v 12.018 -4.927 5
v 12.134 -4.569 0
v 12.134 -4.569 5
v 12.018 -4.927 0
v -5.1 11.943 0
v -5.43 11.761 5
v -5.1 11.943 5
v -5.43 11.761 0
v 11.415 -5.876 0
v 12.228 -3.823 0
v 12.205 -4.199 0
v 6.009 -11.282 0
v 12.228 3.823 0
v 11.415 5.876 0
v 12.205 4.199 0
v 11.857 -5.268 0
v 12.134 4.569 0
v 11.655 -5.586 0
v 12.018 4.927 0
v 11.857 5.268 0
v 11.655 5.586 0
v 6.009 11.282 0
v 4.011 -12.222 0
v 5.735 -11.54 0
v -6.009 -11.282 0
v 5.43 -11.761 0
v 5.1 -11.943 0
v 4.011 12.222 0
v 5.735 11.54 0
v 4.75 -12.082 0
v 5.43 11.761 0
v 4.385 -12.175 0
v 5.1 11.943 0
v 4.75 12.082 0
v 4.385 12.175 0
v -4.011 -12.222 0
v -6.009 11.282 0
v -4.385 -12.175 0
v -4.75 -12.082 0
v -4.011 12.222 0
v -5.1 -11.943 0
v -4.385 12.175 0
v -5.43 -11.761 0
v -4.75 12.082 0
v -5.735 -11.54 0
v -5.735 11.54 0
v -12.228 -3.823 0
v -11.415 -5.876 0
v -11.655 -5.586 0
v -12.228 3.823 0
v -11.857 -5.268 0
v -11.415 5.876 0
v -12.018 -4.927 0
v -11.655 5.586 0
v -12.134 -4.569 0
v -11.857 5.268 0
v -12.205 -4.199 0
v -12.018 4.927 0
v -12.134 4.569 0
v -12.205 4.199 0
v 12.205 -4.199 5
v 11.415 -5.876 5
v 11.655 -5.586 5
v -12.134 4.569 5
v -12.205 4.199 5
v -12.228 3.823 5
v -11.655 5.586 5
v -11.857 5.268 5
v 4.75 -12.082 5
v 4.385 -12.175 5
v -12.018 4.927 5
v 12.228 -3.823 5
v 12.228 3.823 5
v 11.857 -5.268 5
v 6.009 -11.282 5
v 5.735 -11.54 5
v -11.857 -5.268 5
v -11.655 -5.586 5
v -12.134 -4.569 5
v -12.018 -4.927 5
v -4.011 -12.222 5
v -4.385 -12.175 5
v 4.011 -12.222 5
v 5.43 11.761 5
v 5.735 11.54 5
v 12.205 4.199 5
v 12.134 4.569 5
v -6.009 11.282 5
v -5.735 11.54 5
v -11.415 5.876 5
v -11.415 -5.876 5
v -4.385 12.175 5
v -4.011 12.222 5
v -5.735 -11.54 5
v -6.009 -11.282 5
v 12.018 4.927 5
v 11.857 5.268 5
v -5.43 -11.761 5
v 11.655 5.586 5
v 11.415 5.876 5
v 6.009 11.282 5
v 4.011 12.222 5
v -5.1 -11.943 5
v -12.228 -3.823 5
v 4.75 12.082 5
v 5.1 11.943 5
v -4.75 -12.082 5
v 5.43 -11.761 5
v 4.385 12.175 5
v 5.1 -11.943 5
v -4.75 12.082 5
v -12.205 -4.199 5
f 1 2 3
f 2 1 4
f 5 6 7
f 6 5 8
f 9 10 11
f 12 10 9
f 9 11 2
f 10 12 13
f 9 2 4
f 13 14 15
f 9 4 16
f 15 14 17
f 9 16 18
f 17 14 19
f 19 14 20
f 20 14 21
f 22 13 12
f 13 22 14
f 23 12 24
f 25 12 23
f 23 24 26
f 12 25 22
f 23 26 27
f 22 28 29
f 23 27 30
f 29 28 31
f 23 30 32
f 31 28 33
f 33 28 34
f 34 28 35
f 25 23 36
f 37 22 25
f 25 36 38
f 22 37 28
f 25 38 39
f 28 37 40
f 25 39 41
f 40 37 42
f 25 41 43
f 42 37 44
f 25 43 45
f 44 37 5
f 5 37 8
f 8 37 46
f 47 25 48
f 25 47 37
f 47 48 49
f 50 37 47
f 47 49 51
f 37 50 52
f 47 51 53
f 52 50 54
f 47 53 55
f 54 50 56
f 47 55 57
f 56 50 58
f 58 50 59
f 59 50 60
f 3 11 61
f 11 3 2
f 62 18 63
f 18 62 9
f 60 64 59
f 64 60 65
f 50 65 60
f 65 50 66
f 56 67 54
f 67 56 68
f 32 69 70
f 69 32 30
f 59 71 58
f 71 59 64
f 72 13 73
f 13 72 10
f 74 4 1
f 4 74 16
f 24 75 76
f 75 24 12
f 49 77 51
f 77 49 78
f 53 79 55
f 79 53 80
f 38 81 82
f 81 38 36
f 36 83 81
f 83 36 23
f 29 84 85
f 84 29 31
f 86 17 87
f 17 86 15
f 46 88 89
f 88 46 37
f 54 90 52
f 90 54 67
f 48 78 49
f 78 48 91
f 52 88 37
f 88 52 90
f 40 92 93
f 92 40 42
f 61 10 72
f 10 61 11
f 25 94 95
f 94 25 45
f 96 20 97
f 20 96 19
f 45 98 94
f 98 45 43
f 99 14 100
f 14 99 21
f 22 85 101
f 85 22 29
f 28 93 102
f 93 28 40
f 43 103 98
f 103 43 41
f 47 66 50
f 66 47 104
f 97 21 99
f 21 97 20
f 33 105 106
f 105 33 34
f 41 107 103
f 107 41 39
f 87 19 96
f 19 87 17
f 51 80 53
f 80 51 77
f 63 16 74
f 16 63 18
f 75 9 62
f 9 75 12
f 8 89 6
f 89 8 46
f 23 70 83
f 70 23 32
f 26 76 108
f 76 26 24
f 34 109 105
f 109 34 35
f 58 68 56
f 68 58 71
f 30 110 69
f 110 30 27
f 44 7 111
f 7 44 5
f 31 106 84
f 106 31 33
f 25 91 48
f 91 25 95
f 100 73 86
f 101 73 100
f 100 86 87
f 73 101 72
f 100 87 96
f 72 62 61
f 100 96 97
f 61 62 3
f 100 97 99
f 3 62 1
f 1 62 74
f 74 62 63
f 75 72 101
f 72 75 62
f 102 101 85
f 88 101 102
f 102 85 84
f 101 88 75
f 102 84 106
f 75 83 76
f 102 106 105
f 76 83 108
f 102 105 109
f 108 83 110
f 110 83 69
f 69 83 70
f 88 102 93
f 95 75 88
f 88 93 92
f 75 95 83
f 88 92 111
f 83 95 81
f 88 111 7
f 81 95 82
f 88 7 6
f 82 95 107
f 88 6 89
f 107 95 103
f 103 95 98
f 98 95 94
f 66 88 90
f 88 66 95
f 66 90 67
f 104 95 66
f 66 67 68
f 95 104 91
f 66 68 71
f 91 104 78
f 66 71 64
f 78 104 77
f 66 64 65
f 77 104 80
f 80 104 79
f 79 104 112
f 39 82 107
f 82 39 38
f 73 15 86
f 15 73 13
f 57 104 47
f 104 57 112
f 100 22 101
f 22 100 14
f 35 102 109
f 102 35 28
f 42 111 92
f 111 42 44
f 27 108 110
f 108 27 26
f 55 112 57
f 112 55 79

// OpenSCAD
$fn = 50;

difference() {
	union() {
		hull() {
			translate(v = [9.228355330395567, 3.8225099362478887, 0]) {
				cylinder(h = 5, r = 3);
			}
			translate(v = [3.8225099362478896, 9.228355330395567, 0]) {
				cylinder(h = 5, r = 3);
			}
			translate(v = [-3.8225099362478883, 9.228355330395567, 0]) {
				cylinder(h = 5, r = 3);
			}
			translate(v = [-9.228355330395567, 3.82250993624789, 0]) {
				cylinder(h = 5, r = 3);
			}
			translate(v = [-9.22835533039557, -3.822509936247888, 0]) {
				cylinder(h = 5, r = 3);
			}
			translate(v = [-3.822509936247886, -9.22835533039557, 0]) {
				cylinder(h = 5, r = 3);
			}
			translate(v = [3.822509936247891, -9.228355330395567, 0]) {
				cylinder(h = 5, r = 3);
			}
			translate(v = [9.22835533039557, -3.8225099362478865, 0]) {
				cylinder(h = 5, r = 3);
			}
		}
	}
	union();
}
